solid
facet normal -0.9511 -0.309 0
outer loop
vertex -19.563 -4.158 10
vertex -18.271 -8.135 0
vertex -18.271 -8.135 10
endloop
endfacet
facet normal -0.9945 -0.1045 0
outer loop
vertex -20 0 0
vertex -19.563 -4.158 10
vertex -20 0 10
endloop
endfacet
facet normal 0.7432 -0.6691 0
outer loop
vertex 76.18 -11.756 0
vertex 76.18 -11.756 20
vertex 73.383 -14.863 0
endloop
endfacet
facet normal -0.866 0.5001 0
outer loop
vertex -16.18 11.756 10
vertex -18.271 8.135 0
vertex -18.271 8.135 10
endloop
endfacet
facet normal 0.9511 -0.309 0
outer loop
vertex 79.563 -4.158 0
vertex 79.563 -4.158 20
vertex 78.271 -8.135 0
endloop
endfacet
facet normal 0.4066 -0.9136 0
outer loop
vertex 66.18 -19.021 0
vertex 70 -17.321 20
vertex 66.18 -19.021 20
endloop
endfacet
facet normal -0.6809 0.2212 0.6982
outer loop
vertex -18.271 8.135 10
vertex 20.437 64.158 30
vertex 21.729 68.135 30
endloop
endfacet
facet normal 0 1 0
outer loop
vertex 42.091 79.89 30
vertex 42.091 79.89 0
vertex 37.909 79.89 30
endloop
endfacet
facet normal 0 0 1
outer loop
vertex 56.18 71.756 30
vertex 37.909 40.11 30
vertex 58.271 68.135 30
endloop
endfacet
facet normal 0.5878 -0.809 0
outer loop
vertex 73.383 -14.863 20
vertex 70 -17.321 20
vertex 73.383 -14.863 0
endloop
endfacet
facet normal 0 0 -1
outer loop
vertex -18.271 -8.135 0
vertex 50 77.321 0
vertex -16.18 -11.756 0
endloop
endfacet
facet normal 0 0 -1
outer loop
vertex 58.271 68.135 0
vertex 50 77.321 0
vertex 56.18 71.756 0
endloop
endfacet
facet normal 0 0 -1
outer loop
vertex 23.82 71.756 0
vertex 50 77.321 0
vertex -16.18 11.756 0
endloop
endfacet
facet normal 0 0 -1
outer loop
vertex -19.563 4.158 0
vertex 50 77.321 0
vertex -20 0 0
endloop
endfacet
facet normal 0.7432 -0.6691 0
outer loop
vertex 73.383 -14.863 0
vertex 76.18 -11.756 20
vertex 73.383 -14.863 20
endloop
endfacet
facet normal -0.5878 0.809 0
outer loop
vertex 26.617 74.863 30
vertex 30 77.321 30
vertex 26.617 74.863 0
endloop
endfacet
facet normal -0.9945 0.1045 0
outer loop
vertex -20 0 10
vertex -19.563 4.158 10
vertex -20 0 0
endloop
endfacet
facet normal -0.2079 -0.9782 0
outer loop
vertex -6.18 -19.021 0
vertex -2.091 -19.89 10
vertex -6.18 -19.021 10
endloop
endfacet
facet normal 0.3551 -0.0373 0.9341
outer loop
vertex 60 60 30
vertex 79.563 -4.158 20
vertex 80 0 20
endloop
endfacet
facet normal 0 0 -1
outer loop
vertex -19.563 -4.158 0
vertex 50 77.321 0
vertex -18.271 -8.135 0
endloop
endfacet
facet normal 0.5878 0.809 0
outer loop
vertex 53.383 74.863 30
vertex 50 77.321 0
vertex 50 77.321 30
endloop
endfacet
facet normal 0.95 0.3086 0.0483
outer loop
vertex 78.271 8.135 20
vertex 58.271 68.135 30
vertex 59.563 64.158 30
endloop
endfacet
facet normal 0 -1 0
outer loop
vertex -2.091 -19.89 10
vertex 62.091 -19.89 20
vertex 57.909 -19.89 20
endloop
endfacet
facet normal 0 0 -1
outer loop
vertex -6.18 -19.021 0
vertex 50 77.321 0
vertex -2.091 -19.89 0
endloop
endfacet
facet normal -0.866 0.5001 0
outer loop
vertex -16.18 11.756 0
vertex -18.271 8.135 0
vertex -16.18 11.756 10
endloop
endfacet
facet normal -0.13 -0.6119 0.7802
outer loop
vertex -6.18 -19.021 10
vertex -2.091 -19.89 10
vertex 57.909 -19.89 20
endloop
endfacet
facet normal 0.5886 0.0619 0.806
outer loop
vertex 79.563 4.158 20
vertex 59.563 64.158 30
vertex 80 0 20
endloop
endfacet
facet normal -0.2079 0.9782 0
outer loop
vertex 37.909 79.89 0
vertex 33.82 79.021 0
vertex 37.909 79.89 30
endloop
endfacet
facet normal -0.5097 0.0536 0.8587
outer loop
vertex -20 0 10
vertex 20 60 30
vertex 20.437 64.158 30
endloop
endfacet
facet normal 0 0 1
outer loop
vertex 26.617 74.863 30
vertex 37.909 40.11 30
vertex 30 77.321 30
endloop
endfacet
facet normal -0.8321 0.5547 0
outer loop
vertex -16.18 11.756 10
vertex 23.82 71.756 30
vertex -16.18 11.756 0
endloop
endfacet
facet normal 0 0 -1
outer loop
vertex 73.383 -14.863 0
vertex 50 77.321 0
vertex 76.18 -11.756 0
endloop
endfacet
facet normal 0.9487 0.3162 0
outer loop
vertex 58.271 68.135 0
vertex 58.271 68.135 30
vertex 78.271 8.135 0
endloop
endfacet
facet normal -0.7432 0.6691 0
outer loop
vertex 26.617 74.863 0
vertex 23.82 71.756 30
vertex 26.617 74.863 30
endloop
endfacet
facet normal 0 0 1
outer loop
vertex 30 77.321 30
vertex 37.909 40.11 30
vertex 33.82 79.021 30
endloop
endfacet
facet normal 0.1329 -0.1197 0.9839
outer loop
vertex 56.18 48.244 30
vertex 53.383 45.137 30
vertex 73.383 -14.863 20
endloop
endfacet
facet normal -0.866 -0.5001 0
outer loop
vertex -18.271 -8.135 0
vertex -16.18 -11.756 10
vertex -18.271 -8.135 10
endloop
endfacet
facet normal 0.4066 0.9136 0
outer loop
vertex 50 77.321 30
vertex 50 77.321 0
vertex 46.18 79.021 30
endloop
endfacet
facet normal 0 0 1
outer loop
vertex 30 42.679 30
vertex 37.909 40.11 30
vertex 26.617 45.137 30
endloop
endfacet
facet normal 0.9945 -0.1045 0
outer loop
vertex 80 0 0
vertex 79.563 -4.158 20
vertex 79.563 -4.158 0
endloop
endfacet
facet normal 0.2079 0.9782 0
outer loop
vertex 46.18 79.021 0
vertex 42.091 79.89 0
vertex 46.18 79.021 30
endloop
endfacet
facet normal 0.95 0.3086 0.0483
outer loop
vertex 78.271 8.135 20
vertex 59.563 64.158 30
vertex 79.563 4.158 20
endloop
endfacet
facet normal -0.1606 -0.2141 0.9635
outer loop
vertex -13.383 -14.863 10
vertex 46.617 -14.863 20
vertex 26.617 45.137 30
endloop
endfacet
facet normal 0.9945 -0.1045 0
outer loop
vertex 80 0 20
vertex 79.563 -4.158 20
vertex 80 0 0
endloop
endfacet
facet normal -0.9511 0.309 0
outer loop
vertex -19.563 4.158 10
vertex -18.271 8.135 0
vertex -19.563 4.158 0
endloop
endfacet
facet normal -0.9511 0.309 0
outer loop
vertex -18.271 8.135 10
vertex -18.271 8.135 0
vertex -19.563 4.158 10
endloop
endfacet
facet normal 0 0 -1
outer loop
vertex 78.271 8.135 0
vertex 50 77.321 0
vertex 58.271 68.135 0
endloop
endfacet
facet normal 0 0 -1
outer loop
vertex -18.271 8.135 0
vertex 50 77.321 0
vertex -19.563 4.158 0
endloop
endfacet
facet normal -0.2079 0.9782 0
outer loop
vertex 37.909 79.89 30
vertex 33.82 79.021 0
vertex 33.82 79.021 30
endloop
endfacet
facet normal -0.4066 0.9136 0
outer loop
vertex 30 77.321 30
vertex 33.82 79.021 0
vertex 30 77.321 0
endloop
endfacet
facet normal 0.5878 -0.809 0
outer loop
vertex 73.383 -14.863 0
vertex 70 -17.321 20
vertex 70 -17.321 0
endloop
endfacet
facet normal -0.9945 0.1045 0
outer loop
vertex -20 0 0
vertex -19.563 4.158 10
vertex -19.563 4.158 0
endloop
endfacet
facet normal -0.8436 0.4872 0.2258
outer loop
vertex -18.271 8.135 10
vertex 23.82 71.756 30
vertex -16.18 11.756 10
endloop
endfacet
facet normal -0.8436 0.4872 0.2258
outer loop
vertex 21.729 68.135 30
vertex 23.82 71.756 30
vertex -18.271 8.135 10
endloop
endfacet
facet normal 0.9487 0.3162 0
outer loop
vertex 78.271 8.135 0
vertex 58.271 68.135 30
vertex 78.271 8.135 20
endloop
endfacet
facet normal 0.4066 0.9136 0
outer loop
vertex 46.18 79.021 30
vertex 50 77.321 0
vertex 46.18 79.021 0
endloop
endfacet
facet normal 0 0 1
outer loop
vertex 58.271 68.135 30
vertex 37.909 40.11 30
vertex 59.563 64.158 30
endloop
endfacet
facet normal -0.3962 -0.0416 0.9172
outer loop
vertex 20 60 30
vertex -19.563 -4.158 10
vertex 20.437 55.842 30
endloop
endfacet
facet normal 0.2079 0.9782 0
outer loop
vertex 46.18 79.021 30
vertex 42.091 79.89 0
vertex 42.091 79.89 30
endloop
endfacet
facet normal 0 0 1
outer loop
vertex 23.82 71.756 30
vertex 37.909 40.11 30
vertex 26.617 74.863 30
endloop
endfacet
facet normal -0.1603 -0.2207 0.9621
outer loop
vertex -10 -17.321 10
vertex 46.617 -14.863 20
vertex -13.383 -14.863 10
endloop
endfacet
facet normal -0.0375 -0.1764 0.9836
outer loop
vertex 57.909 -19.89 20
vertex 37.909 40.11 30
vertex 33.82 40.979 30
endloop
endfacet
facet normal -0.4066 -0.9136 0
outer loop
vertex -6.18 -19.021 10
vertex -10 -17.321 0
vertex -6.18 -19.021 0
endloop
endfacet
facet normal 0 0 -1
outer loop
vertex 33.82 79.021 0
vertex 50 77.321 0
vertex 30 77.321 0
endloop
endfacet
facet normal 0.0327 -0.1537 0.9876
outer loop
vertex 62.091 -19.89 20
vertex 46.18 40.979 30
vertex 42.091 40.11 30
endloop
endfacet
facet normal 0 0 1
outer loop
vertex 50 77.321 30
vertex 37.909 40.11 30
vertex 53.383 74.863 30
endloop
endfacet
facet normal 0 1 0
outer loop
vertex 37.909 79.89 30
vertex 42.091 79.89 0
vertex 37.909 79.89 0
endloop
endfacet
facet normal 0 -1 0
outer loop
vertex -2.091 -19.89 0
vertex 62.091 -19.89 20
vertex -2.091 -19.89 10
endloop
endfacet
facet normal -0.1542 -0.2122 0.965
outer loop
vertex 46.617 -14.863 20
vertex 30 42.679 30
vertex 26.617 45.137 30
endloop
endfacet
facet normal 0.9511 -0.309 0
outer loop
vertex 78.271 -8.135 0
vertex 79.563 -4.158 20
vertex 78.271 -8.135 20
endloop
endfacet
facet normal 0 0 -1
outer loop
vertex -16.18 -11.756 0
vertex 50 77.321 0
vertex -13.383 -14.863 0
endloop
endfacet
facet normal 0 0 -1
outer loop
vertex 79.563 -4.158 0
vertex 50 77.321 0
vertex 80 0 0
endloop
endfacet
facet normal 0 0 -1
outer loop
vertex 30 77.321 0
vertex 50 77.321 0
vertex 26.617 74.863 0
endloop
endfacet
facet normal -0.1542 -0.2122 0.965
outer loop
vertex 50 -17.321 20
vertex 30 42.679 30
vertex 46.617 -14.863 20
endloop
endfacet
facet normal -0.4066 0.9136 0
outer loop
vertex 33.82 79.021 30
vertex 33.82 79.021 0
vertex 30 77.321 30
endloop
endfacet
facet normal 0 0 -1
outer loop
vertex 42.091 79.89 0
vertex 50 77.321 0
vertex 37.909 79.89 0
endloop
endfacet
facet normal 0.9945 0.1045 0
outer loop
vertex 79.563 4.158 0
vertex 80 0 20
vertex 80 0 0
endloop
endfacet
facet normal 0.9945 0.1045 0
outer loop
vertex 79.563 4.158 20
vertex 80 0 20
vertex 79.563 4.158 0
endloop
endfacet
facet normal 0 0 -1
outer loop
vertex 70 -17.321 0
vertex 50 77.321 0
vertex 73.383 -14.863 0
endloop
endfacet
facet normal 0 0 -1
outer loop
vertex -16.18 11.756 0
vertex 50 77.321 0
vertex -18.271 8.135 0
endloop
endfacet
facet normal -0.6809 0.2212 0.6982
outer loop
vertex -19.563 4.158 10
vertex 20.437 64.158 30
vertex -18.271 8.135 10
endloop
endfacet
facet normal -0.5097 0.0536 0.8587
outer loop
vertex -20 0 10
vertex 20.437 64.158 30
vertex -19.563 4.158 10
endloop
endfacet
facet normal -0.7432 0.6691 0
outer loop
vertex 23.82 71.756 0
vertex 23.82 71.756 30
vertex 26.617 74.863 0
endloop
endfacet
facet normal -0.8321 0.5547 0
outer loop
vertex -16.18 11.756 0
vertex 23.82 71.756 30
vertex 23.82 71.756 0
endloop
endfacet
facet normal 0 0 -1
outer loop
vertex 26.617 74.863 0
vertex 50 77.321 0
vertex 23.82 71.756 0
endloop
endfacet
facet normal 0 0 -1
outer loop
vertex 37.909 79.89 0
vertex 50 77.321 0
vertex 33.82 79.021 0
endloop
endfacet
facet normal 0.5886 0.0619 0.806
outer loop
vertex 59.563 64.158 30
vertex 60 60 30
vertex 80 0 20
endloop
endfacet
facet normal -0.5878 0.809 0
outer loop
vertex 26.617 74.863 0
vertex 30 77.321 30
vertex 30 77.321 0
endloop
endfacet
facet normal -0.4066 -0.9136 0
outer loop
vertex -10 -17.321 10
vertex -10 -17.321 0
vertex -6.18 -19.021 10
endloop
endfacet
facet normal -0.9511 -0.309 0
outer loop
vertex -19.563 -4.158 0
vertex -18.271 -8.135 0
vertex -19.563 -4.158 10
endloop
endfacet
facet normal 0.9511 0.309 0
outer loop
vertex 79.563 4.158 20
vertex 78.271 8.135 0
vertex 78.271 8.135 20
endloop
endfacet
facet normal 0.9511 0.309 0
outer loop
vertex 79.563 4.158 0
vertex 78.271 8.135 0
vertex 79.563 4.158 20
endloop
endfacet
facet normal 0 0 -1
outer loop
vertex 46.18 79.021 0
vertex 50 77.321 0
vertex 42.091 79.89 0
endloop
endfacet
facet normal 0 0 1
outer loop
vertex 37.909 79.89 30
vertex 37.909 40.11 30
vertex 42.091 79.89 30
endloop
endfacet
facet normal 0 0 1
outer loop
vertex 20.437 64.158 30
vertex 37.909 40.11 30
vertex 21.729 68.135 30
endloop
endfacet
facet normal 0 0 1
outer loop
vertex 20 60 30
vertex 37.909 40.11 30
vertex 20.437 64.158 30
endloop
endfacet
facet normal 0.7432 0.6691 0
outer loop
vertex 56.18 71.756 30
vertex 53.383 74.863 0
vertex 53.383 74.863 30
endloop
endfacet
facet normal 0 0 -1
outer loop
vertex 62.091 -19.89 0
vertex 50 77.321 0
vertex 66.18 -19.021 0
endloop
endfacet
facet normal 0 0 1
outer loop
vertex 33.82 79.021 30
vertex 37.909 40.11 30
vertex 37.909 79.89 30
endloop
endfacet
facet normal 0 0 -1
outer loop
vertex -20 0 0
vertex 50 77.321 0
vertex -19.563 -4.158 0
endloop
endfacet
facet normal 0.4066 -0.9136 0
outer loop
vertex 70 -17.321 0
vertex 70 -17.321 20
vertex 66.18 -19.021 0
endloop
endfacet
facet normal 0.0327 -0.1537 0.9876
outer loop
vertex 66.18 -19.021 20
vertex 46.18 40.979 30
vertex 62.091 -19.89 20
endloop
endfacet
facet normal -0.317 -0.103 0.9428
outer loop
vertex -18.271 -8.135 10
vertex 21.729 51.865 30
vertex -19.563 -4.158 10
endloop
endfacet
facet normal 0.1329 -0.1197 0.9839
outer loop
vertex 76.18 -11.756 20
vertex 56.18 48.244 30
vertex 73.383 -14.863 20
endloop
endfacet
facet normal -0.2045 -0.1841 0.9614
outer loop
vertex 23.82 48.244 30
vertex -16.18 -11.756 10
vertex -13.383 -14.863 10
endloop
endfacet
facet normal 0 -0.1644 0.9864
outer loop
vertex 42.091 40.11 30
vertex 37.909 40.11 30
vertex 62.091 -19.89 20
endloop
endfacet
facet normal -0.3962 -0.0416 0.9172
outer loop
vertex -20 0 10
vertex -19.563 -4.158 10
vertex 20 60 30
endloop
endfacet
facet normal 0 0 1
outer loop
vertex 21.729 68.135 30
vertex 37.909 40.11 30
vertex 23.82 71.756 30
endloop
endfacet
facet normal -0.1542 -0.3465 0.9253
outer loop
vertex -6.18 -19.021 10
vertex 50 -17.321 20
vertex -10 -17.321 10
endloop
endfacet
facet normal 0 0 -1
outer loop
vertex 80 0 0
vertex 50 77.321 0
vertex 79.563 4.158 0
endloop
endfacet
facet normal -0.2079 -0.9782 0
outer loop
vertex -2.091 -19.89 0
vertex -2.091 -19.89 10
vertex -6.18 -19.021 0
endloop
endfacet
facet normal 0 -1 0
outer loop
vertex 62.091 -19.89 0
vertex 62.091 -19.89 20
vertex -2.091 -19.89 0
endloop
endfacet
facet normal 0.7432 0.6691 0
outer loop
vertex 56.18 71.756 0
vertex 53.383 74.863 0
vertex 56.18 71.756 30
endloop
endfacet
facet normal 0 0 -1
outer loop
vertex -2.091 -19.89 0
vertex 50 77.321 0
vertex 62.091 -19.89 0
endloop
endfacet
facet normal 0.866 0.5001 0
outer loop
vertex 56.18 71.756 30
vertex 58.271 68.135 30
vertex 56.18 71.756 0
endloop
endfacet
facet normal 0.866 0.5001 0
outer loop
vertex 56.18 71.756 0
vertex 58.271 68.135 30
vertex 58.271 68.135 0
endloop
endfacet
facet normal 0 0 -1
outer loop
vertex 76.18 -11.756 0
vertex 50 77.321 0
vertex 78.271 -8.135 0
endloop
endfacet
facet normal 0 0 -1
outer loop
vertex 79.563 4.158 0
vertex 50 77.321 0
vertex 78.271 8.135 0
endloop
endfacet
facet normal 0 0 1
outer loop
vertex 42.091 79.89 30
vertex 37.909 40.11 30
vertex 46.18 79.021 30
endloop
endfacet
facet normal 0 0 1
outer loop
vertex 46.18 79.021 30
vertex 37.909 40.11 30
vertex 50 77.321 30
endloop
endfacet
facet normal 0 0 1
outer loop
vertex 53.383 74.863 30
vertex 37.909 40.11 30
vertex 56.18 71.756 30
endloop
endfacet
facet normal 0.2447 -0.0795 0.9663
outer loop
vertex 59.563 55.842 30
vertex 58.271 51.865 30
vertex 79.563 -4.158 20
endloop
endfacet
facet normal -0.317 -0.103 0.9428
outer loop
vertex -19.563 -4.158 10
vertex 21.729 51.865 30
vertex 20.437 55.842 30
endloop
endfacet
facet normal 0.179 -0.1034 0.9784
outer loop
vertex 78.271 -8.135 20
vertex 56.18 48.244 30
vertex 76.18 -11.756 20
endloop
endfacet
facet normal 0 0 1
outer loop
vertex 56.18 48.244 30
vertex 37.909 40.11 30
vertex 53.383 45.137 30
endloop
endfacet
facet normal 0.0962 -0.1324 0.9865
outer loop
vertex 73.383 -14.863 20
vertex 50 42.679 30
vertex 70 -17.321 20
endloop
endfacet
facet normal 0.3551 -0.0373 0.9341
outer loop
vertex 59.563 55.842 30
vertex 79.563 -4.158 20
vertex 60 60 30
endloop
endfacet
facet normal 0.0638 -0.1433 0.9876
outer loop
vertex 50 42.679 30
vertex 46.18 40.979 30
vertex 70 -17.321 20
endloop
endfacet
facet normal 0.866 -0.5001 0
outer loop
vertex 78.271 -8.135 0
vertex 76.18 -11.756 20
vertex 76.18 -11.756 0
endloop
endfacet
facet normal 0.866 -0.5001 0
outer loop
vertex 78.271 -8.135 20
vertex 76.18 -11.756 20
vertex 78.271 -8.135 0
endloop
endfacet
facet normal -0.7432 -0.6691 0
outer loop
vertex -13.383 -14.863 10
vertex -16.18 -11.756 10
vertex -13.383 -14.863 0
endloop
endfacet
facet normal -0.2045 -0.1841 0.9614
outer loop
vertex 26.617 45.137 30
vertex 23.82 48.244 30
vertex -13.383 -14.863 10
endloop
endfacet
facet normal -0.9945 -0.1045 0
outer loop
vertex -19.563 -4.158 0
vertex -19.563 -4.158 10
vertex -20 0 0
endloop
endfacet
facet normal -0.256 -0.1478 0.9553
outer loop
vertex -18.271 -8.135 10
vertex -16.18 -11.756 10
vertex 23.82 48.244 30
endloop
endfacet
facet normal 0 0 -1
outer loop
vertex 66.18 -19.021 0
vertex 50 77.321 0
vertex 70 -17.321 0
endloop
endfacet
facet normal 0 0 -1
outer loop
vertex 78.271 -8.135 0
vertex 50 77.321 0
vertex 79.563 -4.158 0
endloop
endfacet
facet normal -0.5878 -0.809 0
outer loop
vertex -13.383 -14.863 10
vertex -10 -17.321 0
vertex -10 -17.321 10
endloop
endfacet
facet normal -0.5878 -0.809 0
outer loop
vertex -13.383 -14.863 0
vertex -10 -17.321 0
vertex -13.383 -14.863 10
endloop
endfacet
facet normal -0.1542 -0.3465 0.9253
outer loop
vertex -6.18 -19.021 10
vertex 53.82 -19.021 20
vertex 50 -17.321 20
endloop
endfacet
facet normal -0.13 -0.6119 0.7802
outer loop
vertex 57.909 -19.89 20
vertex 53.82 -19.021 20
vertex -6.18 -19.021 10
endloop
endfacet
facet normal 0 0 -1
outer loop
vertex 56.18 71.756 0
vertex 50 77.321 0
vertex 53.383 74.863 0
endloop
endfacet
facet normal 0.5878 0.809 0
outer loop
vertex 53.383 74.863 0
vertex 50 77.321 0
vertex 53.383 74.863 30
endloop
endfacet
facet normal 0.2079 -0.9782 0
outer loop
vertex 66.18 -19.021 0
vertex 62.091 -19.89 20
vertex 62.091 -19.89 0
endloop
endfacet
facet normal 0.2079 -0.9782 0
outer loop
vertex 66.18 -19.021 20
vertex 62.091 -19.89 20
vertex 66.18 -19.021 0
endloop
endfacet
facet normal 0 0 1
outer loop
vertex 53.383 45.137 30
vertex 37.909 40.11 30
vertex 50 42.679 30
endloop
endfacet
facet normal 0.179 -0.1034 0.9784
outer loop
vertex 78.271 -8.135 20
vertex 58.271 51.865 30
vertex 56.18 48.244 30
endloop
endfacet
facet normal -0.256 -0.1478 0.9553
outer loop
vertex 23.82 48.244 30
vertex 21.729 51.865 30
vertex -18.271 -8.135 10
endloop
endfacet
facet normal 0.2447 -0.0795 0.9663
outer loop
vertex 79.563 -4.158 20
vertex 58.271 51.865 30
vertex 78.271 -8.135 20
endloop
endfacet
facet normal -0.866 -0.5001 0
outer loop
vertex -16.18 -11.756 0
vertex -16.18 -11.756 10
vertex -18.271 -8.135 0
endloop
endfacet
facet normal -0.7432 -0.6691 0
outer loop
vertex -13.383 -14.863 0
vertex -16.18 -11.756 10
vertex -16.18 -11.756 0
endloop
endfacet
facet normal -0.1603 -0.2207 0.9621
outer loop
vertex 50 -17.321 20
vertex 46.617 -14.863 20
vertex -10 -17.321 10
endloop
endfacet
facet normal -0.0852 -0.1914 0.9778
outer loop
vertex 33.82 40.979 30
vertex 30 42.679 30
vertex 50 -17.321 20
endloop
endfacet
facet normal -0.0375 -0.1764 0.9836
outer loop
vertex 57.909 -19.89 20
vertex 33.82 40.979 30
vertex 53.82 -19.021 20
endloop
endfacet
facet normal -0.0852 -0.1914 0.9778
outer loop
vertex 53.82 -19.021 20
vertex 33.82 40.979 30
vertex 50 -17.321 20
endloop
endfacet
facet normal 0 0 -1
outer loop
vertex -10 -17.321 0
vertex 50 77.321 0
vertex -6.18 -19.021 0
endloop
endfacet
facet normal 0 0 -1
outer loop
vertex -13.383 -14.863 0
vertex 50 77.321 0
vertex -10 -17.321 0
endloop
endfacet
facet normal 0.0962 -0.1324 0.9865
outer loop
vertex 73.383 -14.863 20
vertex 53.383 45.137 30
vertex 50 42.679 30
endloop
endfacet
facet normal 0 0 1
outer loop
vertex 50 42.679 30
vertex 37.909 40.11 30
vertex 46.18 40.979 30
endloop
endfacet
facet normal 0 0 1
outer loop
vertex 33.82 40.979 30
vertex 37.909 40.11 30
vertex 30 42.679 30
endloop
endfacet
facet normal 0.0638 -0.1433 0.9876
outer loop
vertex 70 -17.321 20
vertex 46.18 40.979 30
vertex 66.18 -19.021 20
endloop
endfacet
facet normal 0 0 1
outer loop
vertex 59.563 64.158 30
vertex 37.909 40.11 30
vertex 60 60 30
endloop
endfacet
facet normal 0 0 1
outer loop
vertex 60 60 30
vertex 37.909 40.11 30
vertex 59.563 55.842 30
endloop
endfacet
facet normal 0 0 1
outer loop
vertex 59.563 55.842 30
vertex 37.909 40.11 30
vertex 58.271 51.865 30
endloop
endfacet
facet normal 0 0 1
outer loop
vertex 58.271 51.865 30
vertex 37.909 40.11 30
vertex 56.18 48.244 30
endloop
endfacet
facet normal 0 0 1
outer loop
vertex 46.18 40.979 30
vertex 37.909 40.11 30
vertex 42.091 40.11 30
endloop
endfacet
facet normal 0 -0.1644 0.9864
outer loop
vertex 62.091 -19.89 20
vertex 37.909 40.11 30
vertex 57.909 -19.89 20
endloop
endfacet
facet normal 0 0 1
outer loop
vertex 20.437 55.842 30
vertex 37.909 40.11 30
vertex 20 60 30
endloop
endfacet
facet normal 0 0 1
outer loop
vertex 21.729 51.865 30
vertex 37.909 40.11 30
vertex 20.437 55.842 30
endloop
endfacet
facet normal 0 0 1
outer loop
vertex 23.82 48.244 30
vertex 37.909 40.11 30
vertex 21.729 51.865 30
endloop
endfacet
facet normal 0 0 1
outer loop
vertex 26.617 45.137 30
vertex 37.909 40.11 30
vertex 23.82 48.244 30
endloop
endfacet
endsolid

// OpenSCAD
module placa_snowboard(grosime,raza,lungime)
{
cylinder(h= grosime, r=raza);
    
translate([lungime - 2*raza,0,0]) 
cylinder(h=grosime, r=raza);
    translate ([0, -raza, 0])cube([lungime- 2*raza, 2* raza, grosime]);
}
//--------------------------
module placa_snowboard2(grosime,raza,lungime)
{
    hull(){
 cylinder(h= 2*grosime, r=raza);
    
 translate([lungime - 2*raza,0,0]) cylinder(h=grosime, r=raza);
    }
    
}
//-----------------
module podium(grosime,raza,lungime)
{
hull(){
cylinder(h= grosime, r=raza);
    
translate([lungime - 2*raza,0,0]) 
    cylinder(h=2*grosime, r=raza);
   
translate([(lungime-raza)/2, lungime-2*raza, 0])
    
cylinder(h= 3*grosime, r=raza);
}
}
//--------------------------
//placa_snowboard2(grosime= 10,raza=20 ,lungime=100 );
 podium(grosime= 10,raza=20 ,lungime=100 );
